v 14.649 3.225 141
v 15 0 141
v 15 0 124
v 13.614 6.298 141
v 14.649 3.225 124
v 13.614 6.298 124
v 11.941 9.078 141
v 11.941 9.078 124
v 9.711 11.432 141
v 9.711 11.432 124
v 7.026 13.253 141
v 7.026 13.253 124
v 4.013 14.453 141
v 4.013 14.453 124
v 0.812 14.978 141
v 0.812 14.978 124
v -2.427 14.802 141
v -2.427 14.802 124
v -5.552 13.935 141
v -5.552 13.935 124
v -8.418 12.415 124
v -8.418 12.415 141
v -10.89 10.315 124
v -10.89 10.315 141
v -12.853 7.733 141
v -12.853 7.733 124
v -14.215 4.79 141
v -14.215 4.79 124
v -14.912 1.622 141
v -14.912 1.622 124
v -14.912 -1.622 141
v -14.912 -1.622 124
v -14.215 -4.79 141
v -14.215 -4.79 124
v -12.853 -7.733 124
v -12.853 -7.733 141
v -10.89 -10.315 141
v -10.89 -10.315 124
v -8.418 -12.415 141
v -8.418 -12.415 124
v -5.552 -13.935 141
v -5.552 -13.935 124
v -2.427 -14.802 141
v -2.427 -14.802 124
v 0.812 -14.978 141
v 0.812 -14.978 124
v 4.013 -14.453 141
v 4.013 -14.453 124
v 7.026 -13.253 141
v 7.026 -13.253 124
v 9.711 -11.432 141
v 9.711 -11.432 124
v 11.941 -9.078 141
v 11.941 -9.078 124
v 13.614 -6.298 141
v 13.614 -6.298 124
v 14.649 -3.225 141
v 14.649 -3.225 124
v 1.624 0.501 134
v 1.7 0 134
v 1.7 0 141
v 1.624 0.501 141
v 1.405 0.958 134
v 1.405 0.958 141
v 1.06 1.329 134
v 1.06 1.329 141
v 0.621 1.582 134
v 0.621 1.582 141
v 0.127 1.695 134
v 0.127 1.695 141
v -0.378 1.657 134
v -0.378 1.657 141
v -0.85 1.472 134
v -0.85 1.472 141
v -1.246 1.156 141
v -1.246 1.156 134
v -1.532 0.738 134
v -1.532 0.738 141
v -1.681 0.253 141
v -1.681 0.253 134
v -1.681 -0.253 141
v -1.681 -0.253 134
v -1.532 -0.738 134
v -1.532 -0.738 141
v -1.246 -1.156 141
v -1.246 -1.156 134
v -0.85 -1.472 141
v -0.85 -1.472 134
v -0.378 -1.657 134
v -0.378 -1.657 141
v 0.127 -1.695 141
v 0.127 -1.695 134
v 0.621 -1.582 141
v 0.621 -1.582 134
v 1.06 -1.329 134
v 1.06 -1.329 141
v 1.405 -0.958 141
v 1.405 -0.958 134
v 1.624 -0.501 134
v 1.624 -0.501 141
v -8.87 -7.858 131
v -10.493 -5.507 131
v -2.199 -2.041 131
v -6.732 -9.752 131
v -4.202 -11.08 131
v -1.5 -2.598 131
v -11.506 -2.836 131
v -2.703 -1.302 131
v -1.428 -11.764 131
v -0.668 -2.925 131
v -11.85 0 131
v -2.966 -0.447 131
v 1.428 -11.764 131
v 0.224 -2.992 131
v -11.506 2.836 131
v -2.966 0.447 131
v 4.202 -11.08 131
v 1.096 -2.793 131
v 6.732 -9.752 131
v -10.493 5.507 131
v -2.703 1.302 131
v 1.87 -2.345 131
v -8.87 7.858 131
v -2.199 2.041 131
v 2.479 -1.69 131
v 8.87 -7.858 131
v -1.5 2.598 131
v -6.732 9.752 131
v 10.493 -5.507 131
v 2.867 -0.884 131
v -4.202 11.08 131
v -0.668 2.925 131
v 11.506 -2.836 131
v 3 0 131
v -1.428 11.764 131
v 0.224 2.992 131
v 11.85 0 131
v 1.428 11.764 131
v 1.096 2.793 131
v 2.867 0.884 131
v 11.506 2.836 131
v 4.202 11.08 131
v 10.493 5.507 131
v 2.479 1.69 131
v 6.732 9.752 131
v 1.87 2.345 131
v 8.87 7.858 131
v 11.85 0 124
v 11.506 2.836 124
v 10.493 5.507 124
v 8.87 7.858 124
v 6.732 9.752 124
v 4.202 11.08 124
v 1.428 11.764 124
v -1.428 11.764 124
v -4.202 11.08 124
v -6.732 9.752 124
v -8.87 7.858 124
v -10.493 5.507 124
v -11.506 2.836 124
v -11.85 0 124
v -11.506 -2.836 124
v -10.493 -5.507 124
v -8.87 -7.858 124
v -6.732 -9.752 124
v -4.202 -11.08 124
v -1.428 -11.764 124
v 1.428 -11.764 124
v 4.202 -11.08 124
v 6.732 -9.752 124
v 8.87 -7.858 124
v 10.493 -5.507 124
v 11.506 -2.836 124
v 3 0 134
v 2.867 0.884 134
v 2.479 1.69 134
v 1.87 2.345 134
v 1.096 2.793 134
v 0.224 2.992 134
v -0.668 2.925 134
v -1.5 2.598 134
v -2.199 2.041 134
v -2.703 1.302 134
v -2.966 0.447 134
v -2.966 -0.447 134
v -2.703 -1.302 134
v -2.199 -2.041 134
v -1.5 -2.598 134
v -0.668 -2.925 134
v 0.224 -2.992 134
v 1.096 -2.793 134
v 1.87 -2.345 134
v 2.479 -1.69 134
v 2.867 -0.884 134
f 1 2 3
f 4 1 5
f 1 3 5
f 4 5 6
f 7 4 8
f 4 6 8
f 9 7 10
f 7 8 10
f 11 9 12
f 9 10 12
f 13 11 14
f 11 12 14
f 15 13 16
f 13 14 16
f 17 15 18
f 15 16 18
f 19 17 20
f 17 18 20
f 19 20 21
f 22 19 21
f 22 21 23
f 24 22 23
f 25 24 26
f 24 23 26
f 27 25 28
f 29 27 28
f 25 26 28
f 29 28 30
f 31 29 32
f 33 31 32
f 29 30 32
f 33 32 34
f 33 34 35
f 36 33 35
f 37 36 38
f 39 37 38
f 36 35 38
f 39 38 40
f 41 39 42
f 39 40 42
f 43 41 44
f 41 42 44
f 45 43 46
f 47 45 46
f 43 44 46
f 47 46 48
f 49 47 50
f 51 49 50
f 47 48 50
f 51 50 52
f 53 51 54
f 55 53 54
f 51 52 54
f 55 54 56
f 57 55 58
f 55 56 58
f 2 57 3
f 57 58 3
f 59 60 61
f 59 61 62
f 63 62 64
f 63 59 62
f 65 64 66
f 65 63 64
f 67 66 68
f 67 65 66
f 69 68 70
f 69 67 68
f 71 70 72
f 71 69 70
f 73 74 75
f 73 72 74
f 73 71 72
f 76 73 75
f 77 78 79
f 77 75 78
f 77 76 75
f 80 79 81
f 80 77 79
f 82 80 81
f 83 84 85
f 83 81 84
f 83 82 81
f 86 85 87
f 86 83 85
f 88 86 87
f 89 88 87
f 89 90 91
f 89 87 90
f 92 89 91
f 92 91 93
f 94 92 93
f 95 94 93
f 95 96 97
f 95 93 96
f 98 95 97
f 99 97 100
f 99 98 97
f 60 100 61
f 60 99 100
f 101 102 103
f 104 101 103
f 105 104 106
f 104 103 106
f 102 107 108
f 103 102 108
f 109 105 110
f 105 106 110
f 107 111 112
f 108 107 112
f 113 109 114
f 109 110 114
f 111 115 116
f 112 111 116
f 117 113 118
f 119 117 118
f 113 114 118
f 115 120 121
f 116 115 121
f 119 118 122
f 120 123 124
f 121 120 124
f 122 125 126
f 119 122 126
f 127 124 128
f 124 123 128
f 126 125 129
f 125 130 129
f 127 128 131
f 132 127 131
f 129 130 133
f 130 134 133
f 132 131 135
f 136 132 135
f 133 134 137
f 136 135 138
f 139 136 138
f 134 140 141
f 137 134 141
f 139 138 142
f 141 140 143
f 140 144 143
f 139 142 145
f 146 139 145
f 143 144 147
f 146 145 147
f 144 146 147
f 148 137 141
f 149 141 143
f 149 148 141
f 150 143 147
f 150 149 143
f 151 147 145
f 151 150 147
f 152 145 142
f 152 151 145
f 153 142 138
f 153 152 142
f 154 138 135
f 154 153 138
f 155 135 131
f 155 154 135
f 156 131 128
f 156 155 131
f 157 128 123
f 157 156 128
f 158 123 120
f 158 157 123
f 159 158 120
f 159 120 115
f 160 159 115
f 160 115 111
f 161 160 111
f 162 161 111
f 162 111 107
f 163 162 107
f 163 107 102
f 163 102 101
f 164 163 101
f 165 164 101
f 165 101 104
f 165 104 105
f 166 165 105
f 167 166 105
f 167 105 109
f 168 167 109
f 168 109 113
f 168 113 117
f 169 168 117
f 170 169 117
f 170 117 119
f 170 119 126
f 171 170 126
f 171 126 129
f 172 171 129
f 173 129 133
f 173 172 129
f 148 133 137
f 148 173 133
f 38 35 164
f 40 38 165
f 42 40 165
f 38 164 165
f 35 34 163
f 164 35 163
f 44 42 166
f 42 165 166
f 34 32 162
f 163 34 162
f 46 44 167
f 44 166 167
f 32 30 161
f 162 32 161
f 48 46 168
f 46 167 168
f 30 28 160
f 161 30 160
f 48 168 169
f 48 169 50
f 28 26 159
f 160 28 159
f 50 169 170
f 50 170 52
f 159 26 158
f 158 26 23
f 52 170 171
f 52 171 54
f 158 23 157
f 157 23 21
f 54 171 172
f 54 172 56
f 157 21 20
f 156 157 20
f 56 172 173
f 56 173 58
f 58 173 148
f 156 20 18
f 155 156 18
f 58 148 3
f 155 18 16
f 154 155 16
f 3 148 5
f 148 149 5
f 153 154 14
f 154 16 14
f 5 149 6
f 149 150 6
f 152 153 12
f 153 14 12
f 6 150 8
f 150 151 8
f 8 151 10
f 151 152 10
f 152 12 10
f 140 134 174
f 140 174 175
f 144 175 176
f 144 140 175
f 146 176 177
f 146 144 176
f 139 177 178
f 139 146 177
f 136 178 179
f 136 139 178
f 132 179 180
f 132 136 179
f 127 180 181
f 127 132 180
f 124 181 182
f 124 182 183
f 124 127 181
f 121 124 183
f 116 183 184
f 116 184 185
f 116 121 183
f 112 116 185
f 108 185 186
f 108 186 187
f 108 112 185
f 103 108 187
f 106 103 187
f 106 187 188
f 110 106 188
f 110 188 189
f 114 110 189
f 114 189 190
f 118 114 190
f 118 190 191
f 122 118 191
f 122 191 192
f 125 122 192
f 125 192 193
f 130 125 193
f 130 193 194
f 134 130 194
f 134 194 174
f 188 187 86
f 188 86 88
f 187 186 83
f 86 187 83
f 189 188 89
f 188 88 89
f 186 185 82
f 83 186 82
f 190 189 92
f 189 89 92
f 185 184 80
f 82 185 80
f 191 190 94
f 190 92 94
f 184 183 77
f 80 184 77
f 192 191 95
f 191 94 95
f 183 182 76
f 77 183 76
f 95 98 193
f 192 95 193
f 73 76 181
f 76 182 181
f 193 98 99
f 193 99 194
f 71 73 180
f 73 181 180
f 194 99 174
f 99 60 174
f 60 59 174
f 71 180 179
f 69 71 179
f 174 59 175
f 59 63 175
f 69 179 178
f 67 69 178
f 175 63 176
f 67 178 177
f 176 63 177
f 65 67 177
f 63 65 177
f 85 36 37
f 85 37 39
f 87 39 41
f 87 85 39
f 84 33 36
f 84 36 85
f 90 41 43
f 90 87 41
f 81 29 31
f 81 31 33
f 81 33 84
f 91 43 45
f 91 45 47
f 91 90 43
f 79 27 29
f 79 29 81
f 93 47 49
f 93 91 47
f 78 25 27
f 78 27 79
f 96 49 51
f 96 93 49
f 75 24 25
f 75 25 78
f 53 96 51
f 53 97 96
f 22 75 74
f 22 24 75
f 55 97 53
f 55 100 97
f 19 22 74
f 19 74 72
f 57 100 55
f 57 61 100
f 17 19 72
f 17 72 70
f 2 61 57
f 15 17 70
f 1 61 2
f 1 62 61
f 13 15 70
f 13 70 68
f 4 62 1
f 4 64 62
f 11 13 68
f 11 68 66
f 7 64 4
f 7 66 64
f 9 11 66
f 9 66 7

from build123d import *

# Parameters (mm, degrees)
CYLINDER091_R     = 3
CYLINDER091_DEPTH = 10
CYLINDER090_R     = 1.7
CYLINDER090_DEPTH = 30
CYLINDER092_R     = 11.85
CYLINDER092_DEPTH = 100
CYLINDER014_R     = 15
CYLINDER014_DEPTH = 17


with BuildPart() as cylinder369:
    # Cylinder091 → Cylinder091 (new body)
    with BuildSketch(Plane.XY.offset(124)):
        Circle(CYLINDER091_R)
    extrude(amount=CYLINDER091_DEPTH)


with BuildPart() as cylinder368:
    # Cylinder090 → Cylinder090 (new body)
    with BuildSketch(Plane.XY.offset(128)):
        Circle(CYLINDER090_R)
    extrude(amount=CYLINDER090_DEPTH)


with BuildPart() as cylinder370:
    # Cylinder092 → Cylinder092 (new body)
    with BuildSketch(Plane.XY.offset(31)):
        Circle(CYLINDER092_R)
    extrude(amount=CYLINDER092_DEPTH)


with BuildPart() as winder_end_free:
    # Cylinder014 → Cylinder014 (new body)
    with BuildSketch(Plane.XY.offset(124)):
        Circle(CYLINDER014_R)
    extrude(amount=CYLINDER014_DEPTH)

    # Cut050: cut Cylinder370
    add(cylinder370.part, mode=Mode.SUBTRACT)

    # Cut051: cut Cylinder368
    add(cylinder368.part, mode=Mode.SUBTRACT)

    # Cut052: cut Cylinder369
    add(cylinder369.part, mode=Mode.SUBTRACT)


solid = winder_end_free.part
